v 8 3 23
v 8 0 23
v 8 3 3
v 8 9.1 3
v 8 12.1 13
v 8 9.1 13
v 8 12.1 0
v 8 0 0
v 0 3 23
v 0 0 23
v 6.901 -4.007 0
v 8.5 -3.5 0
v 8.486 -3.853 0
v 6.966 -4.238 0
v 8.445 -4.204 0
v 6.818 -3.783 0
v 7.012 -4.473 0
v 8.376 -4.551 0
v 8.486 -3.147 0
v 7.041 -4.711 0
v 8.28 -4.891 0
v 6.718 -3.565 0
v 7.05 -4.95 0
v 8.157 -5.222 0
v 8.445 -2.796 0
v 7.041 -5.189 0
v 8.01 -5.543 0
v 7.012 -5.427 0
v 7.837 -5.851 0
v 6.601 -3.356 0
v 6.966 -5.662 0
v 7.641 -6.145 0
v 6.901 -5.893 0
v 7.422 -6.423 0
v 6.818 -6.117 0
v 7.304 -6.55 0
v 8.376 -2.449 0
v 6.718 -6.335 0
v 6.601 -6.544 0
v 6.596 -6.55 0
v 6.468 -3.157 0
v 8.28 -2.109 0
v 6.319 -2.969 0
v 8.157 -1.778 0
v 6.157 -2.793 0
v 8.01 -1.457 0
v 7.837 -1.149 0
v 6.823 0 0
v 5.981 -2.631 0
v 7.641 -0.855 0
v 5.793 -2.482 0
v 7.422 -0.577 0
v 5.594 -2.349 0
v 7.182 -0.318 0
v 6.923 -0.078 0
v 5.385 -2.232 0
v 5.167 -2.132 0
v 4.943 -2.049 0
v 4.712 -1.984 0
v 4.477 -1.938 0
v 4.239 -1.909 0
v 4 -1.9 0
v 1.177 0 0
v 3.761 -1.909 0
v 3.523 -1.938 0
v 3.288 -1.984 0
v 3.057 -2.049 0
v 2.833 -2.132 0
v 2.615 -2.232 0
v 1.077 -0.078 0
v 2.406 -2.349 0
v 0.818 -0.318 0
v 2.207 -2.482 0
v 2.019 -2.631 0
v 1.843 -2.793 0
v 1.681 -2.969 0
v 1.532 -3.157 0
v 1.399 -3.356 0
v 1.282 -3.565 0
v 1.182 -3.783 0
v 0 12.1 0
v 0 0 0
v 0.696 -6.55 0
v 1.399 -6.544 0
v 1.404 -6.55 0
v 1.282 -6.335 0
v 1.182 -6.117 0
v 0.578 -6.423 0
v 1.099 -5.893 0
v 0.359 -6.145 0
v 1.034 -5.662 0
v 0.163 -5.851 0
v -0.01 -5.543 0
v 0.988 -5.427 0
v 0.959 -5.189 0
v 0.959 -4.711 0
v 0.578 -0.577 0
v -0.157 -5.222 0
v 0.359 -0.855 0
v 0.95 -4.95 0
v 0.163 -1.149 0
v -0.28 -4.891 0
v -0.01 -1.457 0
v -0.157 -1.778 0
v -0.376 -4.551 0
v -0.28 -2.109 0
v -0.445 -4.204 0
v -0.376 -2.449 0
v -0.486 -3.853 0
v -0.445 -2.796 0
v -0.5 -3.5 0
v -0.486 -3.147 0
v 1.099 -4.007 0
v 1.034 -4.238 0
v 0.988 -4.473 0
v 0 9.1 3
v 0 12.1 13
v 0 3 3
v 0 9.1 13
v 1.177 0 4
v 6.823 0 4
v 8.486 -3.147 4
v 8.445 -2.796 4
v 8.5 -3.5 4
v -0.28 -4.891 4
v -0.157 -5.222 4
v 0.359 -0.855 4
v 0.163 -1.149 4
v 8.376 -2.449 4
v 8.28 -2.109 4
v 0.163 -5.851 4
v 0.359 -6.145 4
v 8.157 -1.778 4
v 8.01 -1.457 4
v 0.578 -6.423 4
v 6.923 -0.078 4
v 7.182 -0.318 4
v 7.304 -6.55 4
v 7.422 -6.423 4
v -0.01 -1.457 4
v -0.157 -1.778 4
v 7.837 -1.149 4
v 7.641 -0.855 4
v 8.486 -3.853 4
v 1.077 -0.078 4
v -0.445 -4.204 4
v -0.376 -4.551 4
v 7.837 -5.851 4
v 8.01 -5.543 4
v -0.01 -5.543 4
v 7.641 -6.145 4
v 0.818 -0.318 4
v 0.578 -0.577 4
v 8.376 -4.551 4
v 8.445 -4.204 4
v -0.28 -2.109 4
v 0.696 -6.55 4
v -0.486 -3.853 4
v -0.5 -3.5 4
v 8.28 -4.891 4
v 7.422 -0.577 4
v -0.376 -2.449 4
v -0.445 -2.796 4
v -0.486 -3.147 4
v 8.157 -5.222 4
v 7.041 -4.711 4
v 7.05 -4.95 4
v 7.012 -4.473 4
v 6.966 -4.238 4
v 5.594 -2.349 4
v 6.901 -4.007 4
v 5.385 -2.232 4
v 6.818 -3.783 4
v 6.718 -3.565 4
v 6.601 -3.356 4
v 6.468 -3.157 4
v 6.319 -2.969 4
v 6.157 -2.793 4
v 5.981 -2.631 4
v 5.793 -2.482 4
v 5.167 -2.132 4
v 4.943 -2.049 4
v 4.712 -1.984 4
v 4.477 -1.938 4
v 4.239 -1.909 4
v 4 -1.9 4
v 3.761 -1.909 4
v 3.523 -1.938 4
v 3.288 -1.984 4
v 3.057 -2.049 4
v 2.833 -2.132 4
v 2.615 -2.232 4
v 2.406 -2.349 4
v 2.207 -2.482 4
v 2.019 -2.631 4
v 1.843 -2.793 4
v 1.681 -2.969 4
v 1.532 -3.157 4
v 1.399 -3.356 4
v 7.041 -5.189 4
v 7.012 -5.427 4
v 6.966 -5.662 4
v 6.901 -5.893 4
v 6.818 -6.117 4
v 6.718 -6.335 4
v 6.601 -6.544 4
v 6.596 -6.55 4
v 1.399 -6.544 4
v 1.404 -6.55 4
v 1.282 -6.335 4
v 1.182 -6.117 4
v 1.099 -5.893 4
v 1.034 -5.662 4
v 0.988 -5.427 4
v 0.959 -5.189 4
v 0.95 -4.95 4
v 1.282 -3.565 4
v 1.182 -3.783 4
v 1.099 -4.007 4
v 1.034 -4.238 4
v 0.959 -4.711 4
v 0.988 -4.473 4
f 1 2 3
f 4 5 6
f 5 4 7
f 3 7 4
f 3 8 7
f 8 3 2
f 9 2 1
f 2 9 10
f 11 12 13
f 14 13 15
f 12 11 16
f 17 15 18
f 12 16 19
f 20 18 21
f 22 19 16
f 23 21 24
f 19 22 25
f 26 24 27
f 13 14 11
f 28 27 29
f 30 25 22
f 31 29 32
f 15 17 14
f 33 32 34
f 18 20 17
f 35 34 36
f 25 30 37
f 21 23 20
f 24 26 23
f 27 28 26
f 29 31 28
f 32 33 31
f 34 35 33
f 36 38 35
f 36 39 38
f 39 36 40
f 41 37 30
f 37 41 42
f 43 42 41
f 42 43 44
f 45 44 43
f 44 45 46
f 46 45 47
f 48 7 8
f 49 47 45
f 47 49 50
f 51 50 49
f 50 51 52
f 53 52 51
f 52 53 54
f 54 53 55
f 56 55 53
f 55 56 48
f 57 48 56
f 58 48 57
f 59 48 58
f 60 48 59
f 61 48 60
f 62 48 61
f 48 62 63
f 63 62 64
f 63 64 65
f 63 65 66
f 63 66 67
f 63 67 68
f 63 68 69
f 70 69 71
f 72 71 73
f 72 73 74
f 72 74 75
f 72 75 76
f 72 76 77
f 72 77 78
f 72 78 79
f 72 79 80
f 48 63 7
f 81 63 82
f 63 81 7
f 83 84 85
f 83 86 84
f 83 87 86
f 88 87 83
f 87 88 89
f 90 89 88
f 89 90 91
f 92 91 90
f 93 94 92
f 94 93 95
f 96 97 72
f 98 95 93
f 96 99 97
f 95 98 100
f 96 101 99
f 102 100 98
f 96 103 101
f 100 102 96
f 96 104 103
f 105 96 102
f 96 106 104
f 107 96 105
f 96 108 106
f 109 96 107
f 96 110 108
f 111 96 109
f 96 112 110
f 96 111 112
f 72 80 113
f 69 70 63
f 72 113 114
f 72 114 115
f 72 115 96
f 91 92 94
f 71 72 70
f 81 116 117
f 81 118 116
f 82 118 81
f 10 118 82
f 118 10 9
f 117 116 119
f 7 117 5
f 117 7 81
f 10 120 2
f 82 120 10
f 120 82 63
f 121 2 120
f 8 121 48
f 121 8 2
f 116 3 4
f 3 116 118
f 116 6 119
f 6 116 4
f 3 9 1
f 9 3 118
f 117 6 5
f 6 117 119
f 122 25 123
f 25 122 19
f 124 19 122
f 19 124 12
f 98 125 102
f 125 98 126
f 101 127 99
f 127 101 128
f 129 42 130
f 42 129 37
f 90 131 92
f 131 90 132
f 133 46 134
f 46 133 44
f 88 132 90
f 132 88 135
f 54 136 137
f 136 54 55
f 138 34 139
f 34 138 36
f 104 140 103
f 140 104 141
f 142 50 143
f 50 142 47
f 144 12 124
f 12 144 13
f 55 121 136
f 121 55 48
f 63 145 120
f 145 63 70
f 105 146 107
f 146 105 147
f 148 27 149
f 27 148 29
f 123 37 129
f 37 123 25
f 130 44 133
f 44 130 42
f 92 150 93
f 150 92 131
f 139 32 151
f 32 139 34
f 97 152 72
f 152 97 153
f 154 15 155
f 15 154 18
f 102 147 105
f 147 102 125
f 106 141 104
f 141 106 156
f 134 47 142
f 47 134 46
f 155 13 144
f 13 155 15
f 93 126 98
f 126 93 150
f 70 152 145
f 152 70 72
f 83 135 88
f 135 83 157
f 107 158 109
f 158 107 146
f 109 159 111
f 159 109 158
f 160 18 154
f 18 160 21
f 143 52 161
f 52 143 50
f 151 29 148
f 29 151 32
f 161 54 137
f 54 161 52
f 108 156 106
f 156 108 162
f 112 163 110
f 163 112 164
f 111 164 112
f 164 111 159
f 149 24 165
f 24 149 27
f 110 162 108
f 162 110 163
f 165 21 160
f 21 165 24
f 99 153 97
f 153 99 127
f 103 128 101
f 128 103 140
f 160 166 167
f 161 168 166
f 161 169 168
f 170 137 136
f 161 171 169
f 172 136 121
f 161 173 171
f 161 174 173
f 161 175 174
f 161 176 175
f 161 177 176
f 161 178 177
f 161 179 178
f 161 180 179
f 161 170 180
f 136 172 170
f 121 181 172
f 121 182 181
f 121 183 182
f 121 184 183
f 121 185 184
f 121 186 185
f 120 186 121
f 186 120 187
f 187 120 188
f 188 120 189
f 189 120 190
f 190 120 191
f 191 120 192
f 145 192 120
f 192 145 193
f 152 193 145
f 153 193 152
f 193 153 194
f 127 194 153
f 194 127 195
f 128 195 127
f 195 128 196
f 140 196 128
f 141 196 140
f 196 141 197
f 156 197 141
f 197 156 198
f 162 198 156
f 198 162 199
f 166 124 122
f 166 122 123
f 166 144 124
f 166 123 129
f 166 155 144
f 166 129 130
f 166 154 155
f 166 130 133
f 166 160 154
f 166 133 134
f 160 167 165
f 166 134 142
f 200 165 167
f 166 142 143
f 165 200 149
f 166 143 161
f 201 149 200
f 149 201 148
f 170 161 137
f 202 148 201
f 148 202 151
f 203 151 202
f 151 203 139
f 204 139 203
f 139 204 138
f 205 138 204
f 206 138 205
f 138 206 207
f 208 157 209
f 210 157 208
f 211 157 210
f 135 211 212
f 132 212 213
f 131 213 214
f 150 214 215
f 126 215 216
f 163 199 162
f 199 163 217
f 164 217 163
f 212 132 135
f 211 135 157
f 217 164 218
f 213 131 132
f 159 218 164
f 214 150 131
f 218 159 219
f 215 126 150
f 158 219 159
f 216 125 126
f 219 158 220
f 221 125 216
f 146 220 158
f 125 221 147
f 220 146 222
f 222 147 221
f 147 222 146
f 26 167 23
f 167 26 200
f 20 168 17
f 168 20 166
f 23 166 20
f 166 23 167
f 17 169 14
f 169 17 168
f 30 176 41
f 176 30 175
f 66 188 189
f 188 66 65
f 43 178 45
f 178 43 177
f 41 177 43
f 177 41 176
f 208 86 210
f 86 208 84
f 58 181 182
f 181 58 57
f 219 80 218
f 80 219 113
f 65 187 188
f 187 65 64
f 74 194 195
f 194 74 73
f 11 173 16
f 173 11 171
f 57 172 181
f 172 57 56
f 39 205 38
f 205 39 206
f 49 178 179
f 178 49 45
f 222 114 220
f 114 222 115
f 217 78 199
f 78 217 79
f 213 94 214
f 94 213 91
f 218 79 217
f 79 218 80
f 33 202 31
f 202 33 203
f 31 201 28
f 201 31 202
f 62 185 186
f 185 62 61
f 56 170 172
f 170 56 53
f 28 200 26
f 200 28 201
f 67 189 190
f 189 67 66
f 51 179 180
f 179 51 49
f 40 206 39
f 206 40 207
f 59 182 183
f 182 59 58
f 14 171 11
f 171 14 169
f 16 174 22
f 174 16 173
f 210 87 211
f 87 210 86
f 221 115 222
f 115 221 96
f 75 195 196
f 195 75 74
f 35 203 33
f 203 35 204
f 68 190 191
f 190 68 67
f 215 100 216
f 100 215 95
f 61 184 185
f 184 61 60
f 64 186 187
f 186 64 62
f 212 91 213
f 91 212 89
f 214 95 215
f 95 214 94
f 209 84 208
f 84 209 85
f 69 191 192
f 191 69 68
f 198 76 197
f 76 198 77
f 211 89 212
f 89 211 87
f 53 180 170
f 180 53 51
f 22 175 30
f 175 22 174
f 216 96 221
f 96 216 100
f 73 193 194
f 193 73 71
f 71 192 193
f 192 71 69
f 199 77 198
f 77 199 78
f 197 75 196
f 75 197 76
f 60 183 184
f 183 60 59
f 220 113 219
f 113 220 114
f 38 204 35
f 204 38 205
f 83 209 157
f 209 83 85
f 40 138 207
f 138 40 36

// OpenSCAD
innerDiam = 6.1;
outerDiam = 9;
glass = 6;
tolerance = 0.1;
innerY = glass + tolerance;
innerZ = 20;
wall = 3;

x = 8;
y = innerY + 2*wall ;
z = innerZ + wall;
clipZ = 4;


cableClip();

module cableClip() {
  openingWidth = innerDiam + 3;
  difference() {
    cube([x, y, z]);
    translate([-1, y - innerY - wall, wall])
      cube([x+2, innerY, innerZ]);
    translate([-1, y - innerY - wall + 1, z - 10])
      cube([x+2, y, 10]);
  }
  clipWall = outerDiam - innerDiam;
  translate([x/2, -outerDiam/2 + 1, 0]) {
    difference() {
      cylinder(d=outerDiam, h=clipZ, $fn=80);
      translate([0, -clipWall/2 , 0])
        cylinder(d=innerDiam, h=clipZ, $fn=80);
      color("red")
        translate([-openingWidth/2, -innerDiam/2 - 3, 0])
          cube([openingWidth, 3, clipZ]);
    }
  }

}
